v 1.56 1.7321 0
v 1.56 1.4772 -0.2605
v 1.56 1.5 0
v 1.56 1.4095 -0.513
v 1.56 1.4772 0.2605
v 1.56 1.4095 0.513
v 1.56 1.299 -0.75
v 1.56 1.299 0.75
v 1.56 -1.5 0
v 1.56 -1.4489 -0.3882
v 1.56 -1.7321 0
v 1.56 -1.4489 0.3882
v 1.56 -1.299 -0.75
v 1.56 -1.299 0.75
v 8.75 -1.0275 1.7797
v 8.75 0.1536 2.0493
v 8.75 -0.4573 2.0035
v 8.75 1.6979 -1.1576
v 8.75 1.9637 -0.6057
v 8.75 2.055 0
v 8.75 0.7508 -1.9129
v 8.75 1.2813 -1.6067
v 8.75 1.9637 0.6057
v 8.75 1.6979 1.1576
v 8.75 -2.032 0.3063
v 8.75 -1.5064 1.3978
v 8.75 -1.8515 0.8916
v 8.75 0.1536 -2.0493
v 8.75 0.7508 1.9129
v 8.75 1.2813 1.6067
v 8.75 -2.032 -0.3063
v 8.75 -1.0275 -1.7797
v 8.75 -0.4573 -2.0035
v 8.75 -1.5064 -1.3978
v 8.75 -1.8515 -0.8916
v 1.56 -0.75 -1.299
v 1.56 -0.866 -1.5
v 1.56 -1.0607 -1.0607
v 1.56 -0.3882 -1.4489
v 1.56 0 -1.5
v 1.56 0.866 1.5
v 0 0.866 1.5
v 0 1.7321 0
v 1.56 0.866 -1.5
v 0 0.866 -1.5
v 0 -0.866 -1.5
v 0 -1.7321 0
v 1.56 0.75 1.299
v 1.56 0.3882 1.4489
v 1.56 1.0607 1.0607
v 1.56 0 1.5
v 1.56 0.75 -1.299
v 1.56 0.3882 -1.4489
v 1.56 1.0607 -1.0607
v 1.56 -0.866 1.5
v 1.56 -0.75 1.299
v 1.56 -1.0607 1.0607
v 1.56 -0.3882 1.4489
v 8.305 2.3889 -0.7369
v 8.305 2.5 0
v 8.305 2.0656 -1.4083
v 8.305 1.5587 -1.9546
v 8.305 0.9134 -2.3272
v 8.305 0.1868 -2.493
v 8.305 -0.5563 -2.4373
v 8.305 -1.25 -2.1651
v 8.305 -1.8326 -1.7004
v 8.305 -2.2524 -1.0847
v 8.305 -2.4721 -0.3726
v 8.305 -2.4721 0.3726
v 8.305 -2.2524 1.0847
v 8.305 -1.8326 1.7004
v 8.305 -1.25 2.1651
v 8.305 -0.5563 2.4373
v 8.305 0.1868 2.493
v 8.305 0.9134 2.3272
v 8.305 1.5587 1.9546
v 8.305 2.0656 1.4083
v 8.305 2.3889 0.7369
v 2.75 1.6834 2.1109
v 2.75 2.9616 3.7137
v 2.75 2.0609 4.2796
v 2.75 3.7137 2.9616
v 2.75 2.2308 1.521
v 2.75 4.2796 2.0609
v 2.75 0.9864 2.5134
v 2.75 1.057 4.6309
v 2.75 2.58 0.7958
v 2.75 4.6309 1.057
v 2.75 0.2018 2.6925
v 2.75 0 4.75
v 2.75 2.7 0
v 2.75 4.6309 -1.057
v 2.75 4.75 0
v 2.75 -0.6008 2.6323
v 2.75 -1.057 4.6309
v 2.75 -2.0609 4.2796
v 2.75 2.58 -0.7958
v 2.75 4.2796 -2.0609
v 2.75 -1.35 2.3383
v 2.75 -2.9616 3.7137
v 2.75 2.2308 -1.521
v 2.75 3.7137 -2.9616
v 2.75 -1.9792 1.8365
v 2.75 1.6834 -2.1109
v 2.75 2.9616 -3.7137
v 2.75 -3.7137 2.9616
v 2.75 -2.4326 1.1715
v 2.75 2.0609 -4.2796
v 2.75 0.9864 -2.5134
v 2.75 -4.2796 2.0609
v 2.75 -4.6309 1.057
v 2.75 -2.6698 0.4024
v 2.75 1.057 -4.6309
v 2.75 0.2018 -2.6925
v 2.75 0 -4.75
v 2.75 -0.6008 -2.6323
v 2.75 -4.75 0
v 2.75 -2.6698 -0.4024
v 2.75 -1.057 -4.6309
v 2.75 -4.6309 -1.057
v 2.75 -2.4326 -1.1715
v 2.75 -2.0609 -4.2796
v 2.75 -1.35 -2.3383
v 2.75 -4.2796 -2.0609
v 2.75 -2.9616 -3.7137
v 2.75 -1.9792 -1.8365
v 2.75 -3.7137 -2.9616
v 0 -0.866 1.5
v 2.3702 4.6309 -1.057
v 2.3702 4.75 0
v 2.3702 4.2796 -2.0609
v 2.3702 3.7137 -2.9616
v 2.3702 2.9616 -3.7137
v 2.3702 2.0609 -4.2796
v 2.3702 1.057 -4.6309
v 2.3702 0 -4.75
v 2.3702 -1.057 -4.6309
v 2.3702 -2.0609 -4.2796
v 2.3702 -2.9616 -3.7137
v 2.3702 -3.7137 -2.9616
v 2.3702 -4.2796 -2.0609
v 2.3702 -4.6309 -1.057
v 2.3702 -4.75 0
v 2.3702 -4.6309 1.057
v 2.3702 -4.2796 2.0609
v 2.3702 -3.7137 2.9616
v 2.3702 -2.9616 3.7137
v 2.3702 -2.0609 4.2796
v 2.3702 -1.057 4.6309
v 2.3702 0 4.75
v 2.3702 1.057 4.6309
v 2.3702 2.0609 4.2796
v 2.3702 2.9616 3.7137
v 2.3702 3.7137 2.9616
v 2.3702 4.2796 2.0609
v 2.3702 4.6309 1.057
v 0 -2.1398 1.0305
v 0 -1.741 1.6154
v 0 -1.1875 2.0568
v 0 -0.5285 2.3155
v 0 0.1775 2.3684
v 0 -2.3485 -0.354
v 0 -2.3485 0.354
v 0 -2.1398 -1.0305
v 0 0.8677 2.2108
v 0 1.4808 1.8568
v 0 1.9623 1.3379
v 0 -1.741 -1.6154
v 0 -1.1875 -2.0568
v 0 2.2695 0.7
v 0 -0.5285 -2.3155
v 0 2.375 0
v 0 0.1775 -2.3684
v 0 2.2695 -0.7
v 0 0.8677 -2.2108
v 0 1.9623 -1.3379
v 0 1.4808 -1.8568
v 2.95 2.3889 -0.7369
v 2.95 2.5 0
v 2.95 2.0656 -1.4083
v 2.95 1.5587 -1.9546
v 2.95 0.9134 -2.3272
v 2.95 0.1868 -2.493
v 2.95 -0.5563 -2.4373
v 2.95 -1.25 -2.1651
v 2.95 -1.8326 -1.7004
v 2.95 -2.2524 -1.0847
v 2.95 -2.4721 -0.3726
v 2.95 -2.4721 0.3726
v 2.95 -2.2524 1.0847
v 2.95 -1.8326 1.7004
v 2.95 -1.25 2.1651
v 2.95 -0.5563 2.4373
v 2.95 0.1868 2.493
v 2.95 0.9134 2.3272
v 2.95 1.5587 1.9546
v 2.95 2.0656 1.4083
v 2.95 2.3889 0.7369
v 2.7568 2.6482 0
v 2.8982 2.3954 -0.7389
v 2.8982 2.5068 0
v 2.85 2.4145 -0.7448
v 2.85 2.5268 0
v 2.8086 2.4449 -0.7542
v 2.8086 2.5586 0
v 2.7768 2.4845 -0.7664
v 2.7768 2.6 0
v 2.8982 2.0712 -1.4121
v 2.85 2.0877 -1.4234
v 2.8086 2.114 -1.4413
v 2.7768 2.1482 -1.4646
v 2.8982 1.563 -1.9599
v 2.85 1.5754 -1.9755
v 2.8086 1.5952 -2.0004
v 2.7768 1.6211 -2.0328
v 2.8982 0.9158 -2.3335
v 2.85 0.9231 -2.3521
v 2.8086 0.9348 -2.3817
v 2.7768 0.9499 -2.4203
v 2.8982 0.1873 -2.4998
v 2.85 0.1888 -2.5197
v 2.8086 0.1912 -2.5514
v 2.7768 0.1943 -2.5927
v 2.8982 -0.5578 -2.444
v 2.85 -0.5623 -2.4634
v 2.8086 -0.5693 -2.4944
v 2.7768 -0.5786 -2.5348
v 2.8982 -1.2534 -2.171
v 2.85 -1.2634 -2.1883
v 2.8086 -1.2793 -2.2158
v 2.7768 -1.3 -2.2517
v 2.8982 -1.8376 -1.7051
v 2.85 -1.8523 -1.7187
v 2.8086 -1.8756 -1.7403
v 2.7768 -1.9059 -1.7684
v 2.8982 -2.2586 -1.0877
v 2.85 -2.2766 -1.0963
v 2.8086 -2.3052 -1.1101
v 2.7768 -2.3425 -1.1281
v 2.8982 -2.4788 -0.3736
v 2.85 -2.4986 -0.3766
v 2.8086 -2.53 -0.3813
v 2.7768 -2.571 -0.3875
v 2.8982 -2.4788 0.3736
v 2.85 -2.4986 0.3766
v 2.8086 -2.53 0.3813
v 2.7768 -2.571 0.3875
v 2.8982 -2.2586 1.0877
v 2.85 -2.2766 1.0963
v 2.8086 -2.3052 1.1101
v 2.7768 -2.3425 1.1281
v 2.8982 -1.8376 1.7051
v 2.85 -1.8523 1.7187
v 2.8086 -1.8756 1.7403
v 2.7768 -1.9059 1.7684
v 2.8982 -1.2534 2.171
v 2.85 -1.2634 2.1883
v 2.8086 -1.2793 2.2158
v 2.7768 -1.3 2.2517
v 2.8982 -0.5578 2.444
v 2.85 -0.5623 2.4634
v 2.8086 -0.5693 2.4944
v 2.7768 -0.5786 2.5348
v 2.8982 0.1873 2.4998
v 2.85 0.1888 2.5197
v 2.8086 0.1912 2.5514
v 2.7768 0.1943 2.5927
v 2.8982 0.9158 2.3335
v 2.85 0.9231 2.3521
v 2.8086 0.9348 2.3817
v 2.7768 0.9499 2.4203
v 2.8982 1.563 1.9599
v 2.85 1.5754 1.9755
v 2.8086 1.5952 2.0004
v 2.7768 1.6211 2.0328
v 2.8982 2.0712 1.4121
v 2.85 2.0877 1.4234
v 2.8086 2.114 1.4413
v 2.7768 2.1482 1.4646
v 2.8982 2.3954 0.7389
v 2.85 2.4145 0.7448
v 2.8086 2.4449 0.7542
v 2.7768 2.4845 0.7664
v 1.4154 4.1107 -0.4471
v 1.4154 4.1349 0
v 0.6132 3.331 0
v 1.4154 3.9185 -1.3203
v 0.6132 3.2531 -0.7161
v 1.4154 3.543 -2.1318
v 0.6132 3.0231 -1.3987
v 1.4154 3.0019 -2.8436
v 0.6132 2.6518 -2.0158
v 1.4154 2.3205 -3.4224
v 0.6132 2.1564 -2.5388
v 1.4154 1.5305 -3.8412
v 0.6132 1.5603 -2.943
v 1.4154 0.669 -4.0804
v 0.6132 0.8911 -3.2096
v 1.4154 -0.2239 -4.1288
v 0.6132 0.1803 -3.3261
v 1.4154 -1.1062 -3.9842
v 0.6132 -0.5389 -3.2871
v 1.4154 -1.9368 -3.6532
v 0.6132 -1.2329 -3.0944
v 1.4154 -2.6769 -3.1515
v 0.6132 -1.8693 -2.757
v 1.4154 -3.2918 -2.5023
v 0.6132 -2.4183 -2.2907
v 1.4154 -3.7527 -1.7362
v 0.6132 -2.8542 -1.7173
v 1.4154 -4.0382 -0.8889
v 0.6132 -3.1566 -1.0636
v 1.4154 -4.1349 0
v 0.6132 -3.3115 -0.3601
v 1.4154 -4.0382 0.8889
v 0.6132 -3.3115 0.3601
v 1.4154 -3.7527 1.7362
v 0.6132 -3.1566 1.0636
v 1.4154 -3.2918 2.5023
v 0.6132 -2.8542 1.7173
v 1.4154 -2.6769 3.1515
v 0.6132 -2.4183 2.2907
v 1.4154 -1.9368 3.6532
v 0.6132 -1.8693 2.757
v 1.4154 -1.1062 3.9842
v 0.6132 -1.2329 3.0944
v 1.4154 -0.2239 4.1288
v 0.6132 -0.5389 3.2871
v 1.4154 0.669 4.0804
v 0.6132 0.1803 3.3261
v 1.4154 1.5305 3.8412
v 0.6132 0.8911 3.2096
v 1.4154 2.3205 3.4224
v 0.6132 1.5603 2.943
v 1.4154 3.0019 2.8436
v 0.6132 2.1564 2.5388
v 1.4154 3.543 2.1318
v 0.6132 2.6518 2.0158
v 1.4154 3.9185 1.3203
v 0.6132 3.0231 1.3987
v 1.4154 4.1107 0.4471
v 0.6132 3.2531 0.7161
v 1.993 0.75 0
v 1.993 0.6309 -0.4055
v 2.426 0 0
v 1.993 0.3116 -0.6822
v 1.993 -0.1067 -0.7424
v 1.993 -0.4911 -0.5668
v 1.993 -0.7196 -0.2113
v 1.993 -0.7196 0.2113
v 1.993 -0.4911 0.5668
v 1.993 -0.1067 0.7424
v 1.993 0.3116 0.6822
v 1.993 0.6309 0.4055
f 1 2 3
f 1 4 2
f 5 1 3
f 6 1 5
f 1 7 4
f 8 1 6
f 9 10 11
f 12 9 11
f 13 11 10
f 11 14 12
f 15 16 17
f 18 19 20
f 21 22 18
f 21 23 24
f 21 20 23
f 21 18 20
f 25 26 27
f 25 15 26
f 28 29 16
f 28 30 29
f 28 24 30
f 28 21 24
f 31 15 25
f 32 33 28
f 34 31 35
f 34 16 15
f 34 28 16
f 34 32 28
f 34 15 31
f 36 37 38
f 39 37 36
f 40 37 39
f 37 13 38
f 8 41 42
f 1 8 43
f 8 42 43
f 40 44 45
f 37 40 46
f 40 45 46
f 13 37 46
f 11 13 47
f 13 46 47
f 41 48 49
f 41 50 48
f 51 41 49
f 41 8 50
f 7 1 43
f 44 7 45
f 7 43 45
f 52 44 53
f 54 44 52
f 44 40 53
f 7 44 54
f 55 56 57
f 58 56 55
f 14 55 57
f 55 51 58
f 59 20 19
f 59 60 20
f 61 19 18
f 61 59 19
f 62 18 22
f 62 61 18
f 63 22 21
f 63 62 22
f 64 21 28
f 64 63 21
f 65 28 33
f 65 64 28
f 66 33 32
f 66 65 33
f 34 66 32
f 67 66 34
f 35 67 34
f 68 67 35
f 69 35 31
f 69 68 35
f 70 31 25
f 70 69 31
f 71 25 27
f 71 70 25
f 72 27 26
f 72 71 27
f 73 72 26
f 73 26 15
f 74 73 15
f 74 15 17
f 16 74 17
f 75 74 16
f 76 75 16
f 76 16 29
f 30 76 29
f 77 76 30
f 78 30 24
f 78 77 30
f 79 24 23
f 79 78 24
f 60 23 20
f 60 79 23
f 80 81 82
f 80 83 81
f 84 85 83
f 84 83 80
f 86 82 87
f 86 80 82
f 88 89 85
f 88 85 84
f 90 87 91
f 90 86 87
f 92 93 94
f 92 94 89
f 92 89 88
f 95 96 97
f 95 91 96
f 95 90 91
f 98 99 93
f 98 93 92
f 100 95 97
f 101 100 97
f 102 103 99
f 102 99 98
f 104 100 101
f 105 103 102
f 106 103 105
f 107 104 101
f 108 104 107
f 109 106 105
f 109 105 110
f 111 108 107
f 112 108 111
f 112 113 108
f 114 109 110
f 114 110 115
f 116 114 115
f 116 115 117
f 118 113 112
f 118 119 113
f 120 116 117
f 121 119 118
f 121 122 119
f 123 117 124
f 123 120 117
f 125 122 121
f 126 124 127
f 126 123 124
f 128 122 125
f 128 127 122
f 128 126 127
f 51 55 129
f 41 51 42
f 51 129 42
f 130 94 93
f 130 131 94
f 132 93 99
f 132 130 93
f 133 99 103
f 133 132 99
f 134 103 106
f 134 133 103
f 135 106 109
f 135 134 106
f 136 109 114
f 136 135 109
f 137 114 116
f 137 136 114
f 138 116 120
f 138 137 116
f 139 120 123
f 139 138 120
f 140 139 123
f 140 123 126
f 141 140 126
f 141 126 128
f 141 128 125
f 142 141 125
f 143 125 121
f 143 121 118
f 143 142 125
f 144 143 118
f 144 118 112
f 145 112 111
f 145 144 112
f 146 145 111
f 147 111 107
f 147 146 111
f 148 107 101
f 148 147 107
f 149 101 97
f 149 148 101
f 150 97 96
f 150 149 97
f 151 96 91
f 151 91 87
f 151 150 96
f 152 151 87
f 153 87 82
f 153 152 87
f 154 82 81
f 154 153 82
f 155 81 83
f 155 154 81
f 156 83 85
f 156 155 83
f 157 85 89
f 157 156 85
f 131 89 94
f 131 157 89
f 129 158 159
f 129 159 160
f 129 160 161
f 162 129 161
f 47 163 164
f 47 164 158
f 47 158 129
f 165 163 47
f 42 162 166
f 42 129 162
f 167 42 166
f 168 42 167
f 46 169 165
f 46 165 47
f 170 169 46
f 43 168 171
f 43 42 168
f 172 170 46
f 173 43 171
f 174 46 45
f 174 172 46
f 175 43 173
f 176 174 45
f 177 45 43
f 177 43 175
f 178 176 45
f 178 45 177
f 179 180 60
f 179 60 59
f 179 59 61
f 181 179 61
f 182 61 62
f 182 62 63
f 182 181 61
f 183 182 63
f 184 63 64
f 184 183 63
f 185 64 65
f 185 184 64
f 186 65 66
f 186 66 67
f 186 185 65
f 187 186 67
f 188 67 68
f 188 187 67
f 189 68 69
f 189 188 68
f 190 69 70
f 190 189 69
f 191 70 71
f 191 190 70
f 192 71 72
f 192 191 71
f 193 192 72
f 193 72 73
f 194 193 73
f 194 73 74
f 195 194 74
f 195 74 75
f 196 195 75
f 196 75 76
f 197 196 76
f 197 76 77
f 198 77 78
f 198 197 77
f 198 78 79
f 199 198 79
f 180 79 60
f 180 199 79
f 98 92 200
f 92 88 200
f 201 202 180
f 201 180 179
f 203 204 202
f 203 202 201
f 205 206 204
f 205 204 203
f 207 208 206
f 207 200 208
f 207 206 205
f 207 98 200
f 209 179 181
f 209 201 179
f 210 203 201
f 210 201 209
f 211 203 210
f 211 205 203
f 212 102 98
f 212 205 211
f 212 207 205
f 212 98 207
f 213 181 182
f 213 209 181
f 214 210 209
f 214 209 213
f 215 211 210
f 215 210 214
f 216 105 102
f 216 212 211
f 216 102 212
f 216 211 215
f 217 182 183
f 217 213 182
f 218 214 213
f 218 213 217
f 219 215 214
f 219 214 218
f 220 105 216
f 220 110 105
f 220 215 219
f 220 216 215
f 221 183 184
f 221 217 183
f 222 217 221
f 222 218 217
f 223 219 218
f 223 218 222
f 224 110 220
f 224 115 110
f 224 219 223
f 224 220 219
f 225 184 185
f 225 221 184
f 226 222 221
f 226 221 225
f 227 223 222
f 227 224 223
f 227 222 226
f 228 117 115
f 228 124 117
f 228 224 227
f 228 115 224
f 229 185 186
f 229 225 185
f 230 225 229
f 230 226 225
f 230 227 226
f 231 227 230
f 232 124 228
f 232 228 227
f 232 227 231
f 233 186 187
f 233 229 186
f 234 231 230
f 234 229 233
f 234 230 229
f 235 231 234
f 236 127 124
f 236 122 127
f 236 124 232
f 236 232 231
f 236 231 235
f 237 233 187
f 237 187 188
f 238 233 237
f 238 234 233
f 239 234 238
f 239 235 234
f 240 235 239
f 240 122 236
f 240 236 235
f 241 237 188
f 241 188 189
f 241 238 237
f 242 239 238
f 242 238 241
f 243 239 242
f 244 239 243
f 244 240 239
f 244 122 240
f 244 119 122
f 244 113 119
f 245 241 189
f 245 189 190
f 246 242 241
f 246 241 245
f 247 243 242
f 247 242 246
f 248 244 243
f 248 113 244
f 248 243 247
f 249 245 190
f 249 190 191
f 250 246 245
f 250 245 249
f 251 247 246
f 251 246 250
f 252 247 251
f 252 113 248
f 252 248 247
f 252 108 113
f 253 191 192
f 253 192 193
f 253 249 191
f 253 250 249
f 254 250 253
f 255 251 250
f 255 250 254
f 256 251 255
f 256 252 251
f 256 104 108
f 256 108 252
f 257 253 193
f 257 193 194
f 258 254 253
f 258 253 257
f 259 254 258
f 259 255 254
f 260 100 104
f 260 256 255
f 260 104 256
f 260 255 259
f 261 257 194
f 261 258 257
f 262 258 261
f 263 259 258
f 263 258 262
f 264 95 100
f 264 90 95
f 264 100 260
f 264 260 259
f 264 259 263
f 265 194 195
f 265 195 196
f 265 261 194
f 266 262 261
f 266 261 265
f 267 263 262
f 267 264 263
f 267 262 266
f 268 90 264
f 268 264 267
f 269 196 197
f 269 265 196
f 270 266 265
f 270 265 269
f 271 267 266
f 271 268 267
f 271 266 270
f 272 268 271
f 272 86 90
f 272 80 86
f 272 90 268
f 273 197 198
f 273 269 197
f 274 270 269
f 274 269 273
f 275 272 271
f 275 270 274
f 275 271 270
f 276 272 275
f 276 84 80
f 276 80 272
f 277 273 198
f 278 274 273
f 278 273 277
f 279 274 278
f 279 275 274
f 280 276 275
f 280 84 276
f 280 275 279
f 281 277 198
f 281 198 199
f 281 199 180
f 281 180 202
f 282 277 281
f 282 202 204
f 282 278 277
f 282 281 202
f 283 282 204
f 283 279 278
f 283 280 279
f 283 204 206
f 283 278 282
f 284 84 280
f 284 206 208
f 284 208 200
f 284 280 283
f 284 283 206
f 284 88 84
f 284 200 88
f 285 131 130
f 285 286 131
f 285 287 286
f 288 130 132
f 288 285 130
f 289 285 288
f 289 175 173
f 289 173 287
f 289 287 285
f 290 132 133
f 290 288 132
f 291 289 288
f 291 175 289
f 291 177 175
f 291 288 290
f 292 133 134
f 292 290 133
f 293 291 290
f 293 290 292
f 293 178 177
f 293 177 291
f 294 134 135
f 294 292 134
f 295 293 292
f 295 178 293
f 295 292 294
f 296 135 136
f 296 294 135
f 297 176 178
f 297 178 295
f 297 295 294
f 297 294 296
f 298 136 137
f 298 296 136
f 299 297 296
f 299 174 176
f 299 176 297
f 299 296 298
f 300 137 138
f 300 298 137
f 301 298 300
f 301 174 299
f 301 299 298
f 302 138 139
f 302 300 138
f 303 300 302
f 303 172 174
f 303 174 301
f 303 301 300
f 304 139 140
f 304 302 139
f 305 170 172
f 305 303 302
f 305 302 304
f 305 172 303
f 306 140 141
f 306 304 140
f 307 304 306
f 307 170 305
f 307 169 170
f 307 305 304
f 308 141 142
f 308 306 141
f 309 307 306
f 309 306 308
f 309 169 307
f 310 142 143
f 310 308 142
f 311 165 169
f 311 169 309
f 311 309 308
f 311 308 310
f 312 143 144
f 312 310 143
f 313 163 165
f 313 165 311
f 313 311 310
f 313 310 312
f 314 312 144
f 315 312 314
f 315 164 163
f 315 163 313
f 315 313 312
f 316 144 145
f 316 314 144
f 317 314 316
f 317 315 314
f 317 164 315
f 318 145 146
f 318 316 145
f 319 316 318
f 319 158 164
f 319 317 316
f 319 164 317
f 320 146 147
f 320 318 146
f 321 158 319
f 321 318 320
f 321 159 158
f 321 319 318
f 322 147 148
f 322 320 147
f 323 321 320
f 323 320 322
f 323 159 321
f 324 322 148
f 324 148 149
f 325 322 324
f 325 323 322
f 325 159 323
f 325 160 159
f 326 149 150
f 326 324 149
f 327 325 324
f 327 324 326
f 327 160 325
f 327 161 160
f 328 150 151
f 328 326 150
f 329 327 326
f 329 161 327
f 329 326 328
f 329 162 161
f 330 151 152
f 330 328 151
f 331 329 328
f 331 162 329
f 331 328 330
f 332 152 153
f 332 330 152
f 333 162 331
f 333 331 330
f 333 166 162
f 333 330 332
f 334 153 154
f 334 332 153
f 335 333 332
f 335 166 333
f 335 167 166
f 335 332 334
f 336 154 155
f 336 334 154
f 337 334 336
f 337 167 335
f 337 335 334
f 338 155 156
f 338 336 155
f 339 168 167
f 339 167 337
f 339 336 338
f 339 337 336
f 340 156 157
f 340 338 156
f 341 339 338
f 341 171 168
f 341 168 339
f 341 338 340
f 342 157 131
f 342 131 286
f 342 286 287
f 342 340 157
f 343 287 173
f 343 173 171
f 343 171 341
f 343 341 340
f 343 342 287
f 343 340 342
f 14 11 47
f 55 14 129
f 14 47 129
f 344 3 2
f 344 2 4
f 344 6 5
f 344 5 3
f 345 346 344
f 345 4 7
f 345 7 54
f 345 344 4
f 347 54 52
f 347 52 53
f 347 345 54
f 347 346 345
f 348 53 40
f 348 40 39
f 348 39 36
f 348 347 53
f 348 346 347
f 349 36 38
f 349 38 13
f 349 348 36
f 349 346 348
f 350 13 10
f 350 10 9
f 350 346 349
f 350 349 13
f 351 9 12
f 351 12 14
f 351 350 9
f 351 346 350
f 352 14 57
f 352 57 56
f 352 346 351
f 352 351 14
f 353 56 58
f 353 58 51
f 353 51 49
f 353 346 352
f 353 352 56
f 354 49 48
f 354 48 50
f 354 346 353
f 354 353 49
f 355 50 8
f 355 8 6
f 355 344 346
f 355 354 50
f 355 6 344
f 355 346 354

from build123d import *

# Parameters (mm, degrees)
FILLET_1_R  = 0.2
HEX_2_DEPTH = 1.56


with BuildPart() as part:
    # Эскиз1 → Body (revolve)
    with BuildSketch(Plane.XY):
        with BuildLine():
            Line((0, 2.375), (0, 0))
            Line((0, 0), (8.75, 0))
            Line((8.75, 0), (8.75, 2.055))
            Line((8.75, 2.055), (8.305, 2.5))
            Line((8.305, 2.5), (2.75, 2.5))
            Line((2.75, 2.5), (2.75, 4.75))
            Line((2.75, 4.75), (2.370164642, 4.75))
            ThreePointArc((2.370164642, 4.75), (0.992749859, 3.754440885), (0, 2.375))
        make_face()
    revolve(axis=Axis((-3.643489966, 0, 0), (-1, 0, 0)))

    # Скругление1
    fillet_1_edges = [part.edges().sort_by_distance(p)[0] for p in [
        (2.75, -2.5, 0),
    ]]
    fillet(fillet_1_edges, radius=FILLET_1_R)

    # Эскиз2 → Вырез-Повернуть1 (revolve, cut)
    with BuildSketch(Plane.XY):
        Polygon((0, 0), (0, 1.5), (1.56, 1.5), (2.426025404, 0), align=None)
    revolve(axis=Axis((2.426025404, 0, 0), (-1, 0, 0)), mode=Mode.SUBTRACT)

    # Эскиз3 → Hex 2 (cut)
    with BuildSketch(Plane.ZY):
        Polygon((-1.5, -0.866025404), (0, -1.732050808), (1.5, -0.866025404), (1.5, 0.866025404), (0, 1.732050808), (-1.5, 0.866025404), align=None)
    extrude(amount=-HEX_2_DEPTH, mode=Mode.SUBTRACT)


solid = part.part
